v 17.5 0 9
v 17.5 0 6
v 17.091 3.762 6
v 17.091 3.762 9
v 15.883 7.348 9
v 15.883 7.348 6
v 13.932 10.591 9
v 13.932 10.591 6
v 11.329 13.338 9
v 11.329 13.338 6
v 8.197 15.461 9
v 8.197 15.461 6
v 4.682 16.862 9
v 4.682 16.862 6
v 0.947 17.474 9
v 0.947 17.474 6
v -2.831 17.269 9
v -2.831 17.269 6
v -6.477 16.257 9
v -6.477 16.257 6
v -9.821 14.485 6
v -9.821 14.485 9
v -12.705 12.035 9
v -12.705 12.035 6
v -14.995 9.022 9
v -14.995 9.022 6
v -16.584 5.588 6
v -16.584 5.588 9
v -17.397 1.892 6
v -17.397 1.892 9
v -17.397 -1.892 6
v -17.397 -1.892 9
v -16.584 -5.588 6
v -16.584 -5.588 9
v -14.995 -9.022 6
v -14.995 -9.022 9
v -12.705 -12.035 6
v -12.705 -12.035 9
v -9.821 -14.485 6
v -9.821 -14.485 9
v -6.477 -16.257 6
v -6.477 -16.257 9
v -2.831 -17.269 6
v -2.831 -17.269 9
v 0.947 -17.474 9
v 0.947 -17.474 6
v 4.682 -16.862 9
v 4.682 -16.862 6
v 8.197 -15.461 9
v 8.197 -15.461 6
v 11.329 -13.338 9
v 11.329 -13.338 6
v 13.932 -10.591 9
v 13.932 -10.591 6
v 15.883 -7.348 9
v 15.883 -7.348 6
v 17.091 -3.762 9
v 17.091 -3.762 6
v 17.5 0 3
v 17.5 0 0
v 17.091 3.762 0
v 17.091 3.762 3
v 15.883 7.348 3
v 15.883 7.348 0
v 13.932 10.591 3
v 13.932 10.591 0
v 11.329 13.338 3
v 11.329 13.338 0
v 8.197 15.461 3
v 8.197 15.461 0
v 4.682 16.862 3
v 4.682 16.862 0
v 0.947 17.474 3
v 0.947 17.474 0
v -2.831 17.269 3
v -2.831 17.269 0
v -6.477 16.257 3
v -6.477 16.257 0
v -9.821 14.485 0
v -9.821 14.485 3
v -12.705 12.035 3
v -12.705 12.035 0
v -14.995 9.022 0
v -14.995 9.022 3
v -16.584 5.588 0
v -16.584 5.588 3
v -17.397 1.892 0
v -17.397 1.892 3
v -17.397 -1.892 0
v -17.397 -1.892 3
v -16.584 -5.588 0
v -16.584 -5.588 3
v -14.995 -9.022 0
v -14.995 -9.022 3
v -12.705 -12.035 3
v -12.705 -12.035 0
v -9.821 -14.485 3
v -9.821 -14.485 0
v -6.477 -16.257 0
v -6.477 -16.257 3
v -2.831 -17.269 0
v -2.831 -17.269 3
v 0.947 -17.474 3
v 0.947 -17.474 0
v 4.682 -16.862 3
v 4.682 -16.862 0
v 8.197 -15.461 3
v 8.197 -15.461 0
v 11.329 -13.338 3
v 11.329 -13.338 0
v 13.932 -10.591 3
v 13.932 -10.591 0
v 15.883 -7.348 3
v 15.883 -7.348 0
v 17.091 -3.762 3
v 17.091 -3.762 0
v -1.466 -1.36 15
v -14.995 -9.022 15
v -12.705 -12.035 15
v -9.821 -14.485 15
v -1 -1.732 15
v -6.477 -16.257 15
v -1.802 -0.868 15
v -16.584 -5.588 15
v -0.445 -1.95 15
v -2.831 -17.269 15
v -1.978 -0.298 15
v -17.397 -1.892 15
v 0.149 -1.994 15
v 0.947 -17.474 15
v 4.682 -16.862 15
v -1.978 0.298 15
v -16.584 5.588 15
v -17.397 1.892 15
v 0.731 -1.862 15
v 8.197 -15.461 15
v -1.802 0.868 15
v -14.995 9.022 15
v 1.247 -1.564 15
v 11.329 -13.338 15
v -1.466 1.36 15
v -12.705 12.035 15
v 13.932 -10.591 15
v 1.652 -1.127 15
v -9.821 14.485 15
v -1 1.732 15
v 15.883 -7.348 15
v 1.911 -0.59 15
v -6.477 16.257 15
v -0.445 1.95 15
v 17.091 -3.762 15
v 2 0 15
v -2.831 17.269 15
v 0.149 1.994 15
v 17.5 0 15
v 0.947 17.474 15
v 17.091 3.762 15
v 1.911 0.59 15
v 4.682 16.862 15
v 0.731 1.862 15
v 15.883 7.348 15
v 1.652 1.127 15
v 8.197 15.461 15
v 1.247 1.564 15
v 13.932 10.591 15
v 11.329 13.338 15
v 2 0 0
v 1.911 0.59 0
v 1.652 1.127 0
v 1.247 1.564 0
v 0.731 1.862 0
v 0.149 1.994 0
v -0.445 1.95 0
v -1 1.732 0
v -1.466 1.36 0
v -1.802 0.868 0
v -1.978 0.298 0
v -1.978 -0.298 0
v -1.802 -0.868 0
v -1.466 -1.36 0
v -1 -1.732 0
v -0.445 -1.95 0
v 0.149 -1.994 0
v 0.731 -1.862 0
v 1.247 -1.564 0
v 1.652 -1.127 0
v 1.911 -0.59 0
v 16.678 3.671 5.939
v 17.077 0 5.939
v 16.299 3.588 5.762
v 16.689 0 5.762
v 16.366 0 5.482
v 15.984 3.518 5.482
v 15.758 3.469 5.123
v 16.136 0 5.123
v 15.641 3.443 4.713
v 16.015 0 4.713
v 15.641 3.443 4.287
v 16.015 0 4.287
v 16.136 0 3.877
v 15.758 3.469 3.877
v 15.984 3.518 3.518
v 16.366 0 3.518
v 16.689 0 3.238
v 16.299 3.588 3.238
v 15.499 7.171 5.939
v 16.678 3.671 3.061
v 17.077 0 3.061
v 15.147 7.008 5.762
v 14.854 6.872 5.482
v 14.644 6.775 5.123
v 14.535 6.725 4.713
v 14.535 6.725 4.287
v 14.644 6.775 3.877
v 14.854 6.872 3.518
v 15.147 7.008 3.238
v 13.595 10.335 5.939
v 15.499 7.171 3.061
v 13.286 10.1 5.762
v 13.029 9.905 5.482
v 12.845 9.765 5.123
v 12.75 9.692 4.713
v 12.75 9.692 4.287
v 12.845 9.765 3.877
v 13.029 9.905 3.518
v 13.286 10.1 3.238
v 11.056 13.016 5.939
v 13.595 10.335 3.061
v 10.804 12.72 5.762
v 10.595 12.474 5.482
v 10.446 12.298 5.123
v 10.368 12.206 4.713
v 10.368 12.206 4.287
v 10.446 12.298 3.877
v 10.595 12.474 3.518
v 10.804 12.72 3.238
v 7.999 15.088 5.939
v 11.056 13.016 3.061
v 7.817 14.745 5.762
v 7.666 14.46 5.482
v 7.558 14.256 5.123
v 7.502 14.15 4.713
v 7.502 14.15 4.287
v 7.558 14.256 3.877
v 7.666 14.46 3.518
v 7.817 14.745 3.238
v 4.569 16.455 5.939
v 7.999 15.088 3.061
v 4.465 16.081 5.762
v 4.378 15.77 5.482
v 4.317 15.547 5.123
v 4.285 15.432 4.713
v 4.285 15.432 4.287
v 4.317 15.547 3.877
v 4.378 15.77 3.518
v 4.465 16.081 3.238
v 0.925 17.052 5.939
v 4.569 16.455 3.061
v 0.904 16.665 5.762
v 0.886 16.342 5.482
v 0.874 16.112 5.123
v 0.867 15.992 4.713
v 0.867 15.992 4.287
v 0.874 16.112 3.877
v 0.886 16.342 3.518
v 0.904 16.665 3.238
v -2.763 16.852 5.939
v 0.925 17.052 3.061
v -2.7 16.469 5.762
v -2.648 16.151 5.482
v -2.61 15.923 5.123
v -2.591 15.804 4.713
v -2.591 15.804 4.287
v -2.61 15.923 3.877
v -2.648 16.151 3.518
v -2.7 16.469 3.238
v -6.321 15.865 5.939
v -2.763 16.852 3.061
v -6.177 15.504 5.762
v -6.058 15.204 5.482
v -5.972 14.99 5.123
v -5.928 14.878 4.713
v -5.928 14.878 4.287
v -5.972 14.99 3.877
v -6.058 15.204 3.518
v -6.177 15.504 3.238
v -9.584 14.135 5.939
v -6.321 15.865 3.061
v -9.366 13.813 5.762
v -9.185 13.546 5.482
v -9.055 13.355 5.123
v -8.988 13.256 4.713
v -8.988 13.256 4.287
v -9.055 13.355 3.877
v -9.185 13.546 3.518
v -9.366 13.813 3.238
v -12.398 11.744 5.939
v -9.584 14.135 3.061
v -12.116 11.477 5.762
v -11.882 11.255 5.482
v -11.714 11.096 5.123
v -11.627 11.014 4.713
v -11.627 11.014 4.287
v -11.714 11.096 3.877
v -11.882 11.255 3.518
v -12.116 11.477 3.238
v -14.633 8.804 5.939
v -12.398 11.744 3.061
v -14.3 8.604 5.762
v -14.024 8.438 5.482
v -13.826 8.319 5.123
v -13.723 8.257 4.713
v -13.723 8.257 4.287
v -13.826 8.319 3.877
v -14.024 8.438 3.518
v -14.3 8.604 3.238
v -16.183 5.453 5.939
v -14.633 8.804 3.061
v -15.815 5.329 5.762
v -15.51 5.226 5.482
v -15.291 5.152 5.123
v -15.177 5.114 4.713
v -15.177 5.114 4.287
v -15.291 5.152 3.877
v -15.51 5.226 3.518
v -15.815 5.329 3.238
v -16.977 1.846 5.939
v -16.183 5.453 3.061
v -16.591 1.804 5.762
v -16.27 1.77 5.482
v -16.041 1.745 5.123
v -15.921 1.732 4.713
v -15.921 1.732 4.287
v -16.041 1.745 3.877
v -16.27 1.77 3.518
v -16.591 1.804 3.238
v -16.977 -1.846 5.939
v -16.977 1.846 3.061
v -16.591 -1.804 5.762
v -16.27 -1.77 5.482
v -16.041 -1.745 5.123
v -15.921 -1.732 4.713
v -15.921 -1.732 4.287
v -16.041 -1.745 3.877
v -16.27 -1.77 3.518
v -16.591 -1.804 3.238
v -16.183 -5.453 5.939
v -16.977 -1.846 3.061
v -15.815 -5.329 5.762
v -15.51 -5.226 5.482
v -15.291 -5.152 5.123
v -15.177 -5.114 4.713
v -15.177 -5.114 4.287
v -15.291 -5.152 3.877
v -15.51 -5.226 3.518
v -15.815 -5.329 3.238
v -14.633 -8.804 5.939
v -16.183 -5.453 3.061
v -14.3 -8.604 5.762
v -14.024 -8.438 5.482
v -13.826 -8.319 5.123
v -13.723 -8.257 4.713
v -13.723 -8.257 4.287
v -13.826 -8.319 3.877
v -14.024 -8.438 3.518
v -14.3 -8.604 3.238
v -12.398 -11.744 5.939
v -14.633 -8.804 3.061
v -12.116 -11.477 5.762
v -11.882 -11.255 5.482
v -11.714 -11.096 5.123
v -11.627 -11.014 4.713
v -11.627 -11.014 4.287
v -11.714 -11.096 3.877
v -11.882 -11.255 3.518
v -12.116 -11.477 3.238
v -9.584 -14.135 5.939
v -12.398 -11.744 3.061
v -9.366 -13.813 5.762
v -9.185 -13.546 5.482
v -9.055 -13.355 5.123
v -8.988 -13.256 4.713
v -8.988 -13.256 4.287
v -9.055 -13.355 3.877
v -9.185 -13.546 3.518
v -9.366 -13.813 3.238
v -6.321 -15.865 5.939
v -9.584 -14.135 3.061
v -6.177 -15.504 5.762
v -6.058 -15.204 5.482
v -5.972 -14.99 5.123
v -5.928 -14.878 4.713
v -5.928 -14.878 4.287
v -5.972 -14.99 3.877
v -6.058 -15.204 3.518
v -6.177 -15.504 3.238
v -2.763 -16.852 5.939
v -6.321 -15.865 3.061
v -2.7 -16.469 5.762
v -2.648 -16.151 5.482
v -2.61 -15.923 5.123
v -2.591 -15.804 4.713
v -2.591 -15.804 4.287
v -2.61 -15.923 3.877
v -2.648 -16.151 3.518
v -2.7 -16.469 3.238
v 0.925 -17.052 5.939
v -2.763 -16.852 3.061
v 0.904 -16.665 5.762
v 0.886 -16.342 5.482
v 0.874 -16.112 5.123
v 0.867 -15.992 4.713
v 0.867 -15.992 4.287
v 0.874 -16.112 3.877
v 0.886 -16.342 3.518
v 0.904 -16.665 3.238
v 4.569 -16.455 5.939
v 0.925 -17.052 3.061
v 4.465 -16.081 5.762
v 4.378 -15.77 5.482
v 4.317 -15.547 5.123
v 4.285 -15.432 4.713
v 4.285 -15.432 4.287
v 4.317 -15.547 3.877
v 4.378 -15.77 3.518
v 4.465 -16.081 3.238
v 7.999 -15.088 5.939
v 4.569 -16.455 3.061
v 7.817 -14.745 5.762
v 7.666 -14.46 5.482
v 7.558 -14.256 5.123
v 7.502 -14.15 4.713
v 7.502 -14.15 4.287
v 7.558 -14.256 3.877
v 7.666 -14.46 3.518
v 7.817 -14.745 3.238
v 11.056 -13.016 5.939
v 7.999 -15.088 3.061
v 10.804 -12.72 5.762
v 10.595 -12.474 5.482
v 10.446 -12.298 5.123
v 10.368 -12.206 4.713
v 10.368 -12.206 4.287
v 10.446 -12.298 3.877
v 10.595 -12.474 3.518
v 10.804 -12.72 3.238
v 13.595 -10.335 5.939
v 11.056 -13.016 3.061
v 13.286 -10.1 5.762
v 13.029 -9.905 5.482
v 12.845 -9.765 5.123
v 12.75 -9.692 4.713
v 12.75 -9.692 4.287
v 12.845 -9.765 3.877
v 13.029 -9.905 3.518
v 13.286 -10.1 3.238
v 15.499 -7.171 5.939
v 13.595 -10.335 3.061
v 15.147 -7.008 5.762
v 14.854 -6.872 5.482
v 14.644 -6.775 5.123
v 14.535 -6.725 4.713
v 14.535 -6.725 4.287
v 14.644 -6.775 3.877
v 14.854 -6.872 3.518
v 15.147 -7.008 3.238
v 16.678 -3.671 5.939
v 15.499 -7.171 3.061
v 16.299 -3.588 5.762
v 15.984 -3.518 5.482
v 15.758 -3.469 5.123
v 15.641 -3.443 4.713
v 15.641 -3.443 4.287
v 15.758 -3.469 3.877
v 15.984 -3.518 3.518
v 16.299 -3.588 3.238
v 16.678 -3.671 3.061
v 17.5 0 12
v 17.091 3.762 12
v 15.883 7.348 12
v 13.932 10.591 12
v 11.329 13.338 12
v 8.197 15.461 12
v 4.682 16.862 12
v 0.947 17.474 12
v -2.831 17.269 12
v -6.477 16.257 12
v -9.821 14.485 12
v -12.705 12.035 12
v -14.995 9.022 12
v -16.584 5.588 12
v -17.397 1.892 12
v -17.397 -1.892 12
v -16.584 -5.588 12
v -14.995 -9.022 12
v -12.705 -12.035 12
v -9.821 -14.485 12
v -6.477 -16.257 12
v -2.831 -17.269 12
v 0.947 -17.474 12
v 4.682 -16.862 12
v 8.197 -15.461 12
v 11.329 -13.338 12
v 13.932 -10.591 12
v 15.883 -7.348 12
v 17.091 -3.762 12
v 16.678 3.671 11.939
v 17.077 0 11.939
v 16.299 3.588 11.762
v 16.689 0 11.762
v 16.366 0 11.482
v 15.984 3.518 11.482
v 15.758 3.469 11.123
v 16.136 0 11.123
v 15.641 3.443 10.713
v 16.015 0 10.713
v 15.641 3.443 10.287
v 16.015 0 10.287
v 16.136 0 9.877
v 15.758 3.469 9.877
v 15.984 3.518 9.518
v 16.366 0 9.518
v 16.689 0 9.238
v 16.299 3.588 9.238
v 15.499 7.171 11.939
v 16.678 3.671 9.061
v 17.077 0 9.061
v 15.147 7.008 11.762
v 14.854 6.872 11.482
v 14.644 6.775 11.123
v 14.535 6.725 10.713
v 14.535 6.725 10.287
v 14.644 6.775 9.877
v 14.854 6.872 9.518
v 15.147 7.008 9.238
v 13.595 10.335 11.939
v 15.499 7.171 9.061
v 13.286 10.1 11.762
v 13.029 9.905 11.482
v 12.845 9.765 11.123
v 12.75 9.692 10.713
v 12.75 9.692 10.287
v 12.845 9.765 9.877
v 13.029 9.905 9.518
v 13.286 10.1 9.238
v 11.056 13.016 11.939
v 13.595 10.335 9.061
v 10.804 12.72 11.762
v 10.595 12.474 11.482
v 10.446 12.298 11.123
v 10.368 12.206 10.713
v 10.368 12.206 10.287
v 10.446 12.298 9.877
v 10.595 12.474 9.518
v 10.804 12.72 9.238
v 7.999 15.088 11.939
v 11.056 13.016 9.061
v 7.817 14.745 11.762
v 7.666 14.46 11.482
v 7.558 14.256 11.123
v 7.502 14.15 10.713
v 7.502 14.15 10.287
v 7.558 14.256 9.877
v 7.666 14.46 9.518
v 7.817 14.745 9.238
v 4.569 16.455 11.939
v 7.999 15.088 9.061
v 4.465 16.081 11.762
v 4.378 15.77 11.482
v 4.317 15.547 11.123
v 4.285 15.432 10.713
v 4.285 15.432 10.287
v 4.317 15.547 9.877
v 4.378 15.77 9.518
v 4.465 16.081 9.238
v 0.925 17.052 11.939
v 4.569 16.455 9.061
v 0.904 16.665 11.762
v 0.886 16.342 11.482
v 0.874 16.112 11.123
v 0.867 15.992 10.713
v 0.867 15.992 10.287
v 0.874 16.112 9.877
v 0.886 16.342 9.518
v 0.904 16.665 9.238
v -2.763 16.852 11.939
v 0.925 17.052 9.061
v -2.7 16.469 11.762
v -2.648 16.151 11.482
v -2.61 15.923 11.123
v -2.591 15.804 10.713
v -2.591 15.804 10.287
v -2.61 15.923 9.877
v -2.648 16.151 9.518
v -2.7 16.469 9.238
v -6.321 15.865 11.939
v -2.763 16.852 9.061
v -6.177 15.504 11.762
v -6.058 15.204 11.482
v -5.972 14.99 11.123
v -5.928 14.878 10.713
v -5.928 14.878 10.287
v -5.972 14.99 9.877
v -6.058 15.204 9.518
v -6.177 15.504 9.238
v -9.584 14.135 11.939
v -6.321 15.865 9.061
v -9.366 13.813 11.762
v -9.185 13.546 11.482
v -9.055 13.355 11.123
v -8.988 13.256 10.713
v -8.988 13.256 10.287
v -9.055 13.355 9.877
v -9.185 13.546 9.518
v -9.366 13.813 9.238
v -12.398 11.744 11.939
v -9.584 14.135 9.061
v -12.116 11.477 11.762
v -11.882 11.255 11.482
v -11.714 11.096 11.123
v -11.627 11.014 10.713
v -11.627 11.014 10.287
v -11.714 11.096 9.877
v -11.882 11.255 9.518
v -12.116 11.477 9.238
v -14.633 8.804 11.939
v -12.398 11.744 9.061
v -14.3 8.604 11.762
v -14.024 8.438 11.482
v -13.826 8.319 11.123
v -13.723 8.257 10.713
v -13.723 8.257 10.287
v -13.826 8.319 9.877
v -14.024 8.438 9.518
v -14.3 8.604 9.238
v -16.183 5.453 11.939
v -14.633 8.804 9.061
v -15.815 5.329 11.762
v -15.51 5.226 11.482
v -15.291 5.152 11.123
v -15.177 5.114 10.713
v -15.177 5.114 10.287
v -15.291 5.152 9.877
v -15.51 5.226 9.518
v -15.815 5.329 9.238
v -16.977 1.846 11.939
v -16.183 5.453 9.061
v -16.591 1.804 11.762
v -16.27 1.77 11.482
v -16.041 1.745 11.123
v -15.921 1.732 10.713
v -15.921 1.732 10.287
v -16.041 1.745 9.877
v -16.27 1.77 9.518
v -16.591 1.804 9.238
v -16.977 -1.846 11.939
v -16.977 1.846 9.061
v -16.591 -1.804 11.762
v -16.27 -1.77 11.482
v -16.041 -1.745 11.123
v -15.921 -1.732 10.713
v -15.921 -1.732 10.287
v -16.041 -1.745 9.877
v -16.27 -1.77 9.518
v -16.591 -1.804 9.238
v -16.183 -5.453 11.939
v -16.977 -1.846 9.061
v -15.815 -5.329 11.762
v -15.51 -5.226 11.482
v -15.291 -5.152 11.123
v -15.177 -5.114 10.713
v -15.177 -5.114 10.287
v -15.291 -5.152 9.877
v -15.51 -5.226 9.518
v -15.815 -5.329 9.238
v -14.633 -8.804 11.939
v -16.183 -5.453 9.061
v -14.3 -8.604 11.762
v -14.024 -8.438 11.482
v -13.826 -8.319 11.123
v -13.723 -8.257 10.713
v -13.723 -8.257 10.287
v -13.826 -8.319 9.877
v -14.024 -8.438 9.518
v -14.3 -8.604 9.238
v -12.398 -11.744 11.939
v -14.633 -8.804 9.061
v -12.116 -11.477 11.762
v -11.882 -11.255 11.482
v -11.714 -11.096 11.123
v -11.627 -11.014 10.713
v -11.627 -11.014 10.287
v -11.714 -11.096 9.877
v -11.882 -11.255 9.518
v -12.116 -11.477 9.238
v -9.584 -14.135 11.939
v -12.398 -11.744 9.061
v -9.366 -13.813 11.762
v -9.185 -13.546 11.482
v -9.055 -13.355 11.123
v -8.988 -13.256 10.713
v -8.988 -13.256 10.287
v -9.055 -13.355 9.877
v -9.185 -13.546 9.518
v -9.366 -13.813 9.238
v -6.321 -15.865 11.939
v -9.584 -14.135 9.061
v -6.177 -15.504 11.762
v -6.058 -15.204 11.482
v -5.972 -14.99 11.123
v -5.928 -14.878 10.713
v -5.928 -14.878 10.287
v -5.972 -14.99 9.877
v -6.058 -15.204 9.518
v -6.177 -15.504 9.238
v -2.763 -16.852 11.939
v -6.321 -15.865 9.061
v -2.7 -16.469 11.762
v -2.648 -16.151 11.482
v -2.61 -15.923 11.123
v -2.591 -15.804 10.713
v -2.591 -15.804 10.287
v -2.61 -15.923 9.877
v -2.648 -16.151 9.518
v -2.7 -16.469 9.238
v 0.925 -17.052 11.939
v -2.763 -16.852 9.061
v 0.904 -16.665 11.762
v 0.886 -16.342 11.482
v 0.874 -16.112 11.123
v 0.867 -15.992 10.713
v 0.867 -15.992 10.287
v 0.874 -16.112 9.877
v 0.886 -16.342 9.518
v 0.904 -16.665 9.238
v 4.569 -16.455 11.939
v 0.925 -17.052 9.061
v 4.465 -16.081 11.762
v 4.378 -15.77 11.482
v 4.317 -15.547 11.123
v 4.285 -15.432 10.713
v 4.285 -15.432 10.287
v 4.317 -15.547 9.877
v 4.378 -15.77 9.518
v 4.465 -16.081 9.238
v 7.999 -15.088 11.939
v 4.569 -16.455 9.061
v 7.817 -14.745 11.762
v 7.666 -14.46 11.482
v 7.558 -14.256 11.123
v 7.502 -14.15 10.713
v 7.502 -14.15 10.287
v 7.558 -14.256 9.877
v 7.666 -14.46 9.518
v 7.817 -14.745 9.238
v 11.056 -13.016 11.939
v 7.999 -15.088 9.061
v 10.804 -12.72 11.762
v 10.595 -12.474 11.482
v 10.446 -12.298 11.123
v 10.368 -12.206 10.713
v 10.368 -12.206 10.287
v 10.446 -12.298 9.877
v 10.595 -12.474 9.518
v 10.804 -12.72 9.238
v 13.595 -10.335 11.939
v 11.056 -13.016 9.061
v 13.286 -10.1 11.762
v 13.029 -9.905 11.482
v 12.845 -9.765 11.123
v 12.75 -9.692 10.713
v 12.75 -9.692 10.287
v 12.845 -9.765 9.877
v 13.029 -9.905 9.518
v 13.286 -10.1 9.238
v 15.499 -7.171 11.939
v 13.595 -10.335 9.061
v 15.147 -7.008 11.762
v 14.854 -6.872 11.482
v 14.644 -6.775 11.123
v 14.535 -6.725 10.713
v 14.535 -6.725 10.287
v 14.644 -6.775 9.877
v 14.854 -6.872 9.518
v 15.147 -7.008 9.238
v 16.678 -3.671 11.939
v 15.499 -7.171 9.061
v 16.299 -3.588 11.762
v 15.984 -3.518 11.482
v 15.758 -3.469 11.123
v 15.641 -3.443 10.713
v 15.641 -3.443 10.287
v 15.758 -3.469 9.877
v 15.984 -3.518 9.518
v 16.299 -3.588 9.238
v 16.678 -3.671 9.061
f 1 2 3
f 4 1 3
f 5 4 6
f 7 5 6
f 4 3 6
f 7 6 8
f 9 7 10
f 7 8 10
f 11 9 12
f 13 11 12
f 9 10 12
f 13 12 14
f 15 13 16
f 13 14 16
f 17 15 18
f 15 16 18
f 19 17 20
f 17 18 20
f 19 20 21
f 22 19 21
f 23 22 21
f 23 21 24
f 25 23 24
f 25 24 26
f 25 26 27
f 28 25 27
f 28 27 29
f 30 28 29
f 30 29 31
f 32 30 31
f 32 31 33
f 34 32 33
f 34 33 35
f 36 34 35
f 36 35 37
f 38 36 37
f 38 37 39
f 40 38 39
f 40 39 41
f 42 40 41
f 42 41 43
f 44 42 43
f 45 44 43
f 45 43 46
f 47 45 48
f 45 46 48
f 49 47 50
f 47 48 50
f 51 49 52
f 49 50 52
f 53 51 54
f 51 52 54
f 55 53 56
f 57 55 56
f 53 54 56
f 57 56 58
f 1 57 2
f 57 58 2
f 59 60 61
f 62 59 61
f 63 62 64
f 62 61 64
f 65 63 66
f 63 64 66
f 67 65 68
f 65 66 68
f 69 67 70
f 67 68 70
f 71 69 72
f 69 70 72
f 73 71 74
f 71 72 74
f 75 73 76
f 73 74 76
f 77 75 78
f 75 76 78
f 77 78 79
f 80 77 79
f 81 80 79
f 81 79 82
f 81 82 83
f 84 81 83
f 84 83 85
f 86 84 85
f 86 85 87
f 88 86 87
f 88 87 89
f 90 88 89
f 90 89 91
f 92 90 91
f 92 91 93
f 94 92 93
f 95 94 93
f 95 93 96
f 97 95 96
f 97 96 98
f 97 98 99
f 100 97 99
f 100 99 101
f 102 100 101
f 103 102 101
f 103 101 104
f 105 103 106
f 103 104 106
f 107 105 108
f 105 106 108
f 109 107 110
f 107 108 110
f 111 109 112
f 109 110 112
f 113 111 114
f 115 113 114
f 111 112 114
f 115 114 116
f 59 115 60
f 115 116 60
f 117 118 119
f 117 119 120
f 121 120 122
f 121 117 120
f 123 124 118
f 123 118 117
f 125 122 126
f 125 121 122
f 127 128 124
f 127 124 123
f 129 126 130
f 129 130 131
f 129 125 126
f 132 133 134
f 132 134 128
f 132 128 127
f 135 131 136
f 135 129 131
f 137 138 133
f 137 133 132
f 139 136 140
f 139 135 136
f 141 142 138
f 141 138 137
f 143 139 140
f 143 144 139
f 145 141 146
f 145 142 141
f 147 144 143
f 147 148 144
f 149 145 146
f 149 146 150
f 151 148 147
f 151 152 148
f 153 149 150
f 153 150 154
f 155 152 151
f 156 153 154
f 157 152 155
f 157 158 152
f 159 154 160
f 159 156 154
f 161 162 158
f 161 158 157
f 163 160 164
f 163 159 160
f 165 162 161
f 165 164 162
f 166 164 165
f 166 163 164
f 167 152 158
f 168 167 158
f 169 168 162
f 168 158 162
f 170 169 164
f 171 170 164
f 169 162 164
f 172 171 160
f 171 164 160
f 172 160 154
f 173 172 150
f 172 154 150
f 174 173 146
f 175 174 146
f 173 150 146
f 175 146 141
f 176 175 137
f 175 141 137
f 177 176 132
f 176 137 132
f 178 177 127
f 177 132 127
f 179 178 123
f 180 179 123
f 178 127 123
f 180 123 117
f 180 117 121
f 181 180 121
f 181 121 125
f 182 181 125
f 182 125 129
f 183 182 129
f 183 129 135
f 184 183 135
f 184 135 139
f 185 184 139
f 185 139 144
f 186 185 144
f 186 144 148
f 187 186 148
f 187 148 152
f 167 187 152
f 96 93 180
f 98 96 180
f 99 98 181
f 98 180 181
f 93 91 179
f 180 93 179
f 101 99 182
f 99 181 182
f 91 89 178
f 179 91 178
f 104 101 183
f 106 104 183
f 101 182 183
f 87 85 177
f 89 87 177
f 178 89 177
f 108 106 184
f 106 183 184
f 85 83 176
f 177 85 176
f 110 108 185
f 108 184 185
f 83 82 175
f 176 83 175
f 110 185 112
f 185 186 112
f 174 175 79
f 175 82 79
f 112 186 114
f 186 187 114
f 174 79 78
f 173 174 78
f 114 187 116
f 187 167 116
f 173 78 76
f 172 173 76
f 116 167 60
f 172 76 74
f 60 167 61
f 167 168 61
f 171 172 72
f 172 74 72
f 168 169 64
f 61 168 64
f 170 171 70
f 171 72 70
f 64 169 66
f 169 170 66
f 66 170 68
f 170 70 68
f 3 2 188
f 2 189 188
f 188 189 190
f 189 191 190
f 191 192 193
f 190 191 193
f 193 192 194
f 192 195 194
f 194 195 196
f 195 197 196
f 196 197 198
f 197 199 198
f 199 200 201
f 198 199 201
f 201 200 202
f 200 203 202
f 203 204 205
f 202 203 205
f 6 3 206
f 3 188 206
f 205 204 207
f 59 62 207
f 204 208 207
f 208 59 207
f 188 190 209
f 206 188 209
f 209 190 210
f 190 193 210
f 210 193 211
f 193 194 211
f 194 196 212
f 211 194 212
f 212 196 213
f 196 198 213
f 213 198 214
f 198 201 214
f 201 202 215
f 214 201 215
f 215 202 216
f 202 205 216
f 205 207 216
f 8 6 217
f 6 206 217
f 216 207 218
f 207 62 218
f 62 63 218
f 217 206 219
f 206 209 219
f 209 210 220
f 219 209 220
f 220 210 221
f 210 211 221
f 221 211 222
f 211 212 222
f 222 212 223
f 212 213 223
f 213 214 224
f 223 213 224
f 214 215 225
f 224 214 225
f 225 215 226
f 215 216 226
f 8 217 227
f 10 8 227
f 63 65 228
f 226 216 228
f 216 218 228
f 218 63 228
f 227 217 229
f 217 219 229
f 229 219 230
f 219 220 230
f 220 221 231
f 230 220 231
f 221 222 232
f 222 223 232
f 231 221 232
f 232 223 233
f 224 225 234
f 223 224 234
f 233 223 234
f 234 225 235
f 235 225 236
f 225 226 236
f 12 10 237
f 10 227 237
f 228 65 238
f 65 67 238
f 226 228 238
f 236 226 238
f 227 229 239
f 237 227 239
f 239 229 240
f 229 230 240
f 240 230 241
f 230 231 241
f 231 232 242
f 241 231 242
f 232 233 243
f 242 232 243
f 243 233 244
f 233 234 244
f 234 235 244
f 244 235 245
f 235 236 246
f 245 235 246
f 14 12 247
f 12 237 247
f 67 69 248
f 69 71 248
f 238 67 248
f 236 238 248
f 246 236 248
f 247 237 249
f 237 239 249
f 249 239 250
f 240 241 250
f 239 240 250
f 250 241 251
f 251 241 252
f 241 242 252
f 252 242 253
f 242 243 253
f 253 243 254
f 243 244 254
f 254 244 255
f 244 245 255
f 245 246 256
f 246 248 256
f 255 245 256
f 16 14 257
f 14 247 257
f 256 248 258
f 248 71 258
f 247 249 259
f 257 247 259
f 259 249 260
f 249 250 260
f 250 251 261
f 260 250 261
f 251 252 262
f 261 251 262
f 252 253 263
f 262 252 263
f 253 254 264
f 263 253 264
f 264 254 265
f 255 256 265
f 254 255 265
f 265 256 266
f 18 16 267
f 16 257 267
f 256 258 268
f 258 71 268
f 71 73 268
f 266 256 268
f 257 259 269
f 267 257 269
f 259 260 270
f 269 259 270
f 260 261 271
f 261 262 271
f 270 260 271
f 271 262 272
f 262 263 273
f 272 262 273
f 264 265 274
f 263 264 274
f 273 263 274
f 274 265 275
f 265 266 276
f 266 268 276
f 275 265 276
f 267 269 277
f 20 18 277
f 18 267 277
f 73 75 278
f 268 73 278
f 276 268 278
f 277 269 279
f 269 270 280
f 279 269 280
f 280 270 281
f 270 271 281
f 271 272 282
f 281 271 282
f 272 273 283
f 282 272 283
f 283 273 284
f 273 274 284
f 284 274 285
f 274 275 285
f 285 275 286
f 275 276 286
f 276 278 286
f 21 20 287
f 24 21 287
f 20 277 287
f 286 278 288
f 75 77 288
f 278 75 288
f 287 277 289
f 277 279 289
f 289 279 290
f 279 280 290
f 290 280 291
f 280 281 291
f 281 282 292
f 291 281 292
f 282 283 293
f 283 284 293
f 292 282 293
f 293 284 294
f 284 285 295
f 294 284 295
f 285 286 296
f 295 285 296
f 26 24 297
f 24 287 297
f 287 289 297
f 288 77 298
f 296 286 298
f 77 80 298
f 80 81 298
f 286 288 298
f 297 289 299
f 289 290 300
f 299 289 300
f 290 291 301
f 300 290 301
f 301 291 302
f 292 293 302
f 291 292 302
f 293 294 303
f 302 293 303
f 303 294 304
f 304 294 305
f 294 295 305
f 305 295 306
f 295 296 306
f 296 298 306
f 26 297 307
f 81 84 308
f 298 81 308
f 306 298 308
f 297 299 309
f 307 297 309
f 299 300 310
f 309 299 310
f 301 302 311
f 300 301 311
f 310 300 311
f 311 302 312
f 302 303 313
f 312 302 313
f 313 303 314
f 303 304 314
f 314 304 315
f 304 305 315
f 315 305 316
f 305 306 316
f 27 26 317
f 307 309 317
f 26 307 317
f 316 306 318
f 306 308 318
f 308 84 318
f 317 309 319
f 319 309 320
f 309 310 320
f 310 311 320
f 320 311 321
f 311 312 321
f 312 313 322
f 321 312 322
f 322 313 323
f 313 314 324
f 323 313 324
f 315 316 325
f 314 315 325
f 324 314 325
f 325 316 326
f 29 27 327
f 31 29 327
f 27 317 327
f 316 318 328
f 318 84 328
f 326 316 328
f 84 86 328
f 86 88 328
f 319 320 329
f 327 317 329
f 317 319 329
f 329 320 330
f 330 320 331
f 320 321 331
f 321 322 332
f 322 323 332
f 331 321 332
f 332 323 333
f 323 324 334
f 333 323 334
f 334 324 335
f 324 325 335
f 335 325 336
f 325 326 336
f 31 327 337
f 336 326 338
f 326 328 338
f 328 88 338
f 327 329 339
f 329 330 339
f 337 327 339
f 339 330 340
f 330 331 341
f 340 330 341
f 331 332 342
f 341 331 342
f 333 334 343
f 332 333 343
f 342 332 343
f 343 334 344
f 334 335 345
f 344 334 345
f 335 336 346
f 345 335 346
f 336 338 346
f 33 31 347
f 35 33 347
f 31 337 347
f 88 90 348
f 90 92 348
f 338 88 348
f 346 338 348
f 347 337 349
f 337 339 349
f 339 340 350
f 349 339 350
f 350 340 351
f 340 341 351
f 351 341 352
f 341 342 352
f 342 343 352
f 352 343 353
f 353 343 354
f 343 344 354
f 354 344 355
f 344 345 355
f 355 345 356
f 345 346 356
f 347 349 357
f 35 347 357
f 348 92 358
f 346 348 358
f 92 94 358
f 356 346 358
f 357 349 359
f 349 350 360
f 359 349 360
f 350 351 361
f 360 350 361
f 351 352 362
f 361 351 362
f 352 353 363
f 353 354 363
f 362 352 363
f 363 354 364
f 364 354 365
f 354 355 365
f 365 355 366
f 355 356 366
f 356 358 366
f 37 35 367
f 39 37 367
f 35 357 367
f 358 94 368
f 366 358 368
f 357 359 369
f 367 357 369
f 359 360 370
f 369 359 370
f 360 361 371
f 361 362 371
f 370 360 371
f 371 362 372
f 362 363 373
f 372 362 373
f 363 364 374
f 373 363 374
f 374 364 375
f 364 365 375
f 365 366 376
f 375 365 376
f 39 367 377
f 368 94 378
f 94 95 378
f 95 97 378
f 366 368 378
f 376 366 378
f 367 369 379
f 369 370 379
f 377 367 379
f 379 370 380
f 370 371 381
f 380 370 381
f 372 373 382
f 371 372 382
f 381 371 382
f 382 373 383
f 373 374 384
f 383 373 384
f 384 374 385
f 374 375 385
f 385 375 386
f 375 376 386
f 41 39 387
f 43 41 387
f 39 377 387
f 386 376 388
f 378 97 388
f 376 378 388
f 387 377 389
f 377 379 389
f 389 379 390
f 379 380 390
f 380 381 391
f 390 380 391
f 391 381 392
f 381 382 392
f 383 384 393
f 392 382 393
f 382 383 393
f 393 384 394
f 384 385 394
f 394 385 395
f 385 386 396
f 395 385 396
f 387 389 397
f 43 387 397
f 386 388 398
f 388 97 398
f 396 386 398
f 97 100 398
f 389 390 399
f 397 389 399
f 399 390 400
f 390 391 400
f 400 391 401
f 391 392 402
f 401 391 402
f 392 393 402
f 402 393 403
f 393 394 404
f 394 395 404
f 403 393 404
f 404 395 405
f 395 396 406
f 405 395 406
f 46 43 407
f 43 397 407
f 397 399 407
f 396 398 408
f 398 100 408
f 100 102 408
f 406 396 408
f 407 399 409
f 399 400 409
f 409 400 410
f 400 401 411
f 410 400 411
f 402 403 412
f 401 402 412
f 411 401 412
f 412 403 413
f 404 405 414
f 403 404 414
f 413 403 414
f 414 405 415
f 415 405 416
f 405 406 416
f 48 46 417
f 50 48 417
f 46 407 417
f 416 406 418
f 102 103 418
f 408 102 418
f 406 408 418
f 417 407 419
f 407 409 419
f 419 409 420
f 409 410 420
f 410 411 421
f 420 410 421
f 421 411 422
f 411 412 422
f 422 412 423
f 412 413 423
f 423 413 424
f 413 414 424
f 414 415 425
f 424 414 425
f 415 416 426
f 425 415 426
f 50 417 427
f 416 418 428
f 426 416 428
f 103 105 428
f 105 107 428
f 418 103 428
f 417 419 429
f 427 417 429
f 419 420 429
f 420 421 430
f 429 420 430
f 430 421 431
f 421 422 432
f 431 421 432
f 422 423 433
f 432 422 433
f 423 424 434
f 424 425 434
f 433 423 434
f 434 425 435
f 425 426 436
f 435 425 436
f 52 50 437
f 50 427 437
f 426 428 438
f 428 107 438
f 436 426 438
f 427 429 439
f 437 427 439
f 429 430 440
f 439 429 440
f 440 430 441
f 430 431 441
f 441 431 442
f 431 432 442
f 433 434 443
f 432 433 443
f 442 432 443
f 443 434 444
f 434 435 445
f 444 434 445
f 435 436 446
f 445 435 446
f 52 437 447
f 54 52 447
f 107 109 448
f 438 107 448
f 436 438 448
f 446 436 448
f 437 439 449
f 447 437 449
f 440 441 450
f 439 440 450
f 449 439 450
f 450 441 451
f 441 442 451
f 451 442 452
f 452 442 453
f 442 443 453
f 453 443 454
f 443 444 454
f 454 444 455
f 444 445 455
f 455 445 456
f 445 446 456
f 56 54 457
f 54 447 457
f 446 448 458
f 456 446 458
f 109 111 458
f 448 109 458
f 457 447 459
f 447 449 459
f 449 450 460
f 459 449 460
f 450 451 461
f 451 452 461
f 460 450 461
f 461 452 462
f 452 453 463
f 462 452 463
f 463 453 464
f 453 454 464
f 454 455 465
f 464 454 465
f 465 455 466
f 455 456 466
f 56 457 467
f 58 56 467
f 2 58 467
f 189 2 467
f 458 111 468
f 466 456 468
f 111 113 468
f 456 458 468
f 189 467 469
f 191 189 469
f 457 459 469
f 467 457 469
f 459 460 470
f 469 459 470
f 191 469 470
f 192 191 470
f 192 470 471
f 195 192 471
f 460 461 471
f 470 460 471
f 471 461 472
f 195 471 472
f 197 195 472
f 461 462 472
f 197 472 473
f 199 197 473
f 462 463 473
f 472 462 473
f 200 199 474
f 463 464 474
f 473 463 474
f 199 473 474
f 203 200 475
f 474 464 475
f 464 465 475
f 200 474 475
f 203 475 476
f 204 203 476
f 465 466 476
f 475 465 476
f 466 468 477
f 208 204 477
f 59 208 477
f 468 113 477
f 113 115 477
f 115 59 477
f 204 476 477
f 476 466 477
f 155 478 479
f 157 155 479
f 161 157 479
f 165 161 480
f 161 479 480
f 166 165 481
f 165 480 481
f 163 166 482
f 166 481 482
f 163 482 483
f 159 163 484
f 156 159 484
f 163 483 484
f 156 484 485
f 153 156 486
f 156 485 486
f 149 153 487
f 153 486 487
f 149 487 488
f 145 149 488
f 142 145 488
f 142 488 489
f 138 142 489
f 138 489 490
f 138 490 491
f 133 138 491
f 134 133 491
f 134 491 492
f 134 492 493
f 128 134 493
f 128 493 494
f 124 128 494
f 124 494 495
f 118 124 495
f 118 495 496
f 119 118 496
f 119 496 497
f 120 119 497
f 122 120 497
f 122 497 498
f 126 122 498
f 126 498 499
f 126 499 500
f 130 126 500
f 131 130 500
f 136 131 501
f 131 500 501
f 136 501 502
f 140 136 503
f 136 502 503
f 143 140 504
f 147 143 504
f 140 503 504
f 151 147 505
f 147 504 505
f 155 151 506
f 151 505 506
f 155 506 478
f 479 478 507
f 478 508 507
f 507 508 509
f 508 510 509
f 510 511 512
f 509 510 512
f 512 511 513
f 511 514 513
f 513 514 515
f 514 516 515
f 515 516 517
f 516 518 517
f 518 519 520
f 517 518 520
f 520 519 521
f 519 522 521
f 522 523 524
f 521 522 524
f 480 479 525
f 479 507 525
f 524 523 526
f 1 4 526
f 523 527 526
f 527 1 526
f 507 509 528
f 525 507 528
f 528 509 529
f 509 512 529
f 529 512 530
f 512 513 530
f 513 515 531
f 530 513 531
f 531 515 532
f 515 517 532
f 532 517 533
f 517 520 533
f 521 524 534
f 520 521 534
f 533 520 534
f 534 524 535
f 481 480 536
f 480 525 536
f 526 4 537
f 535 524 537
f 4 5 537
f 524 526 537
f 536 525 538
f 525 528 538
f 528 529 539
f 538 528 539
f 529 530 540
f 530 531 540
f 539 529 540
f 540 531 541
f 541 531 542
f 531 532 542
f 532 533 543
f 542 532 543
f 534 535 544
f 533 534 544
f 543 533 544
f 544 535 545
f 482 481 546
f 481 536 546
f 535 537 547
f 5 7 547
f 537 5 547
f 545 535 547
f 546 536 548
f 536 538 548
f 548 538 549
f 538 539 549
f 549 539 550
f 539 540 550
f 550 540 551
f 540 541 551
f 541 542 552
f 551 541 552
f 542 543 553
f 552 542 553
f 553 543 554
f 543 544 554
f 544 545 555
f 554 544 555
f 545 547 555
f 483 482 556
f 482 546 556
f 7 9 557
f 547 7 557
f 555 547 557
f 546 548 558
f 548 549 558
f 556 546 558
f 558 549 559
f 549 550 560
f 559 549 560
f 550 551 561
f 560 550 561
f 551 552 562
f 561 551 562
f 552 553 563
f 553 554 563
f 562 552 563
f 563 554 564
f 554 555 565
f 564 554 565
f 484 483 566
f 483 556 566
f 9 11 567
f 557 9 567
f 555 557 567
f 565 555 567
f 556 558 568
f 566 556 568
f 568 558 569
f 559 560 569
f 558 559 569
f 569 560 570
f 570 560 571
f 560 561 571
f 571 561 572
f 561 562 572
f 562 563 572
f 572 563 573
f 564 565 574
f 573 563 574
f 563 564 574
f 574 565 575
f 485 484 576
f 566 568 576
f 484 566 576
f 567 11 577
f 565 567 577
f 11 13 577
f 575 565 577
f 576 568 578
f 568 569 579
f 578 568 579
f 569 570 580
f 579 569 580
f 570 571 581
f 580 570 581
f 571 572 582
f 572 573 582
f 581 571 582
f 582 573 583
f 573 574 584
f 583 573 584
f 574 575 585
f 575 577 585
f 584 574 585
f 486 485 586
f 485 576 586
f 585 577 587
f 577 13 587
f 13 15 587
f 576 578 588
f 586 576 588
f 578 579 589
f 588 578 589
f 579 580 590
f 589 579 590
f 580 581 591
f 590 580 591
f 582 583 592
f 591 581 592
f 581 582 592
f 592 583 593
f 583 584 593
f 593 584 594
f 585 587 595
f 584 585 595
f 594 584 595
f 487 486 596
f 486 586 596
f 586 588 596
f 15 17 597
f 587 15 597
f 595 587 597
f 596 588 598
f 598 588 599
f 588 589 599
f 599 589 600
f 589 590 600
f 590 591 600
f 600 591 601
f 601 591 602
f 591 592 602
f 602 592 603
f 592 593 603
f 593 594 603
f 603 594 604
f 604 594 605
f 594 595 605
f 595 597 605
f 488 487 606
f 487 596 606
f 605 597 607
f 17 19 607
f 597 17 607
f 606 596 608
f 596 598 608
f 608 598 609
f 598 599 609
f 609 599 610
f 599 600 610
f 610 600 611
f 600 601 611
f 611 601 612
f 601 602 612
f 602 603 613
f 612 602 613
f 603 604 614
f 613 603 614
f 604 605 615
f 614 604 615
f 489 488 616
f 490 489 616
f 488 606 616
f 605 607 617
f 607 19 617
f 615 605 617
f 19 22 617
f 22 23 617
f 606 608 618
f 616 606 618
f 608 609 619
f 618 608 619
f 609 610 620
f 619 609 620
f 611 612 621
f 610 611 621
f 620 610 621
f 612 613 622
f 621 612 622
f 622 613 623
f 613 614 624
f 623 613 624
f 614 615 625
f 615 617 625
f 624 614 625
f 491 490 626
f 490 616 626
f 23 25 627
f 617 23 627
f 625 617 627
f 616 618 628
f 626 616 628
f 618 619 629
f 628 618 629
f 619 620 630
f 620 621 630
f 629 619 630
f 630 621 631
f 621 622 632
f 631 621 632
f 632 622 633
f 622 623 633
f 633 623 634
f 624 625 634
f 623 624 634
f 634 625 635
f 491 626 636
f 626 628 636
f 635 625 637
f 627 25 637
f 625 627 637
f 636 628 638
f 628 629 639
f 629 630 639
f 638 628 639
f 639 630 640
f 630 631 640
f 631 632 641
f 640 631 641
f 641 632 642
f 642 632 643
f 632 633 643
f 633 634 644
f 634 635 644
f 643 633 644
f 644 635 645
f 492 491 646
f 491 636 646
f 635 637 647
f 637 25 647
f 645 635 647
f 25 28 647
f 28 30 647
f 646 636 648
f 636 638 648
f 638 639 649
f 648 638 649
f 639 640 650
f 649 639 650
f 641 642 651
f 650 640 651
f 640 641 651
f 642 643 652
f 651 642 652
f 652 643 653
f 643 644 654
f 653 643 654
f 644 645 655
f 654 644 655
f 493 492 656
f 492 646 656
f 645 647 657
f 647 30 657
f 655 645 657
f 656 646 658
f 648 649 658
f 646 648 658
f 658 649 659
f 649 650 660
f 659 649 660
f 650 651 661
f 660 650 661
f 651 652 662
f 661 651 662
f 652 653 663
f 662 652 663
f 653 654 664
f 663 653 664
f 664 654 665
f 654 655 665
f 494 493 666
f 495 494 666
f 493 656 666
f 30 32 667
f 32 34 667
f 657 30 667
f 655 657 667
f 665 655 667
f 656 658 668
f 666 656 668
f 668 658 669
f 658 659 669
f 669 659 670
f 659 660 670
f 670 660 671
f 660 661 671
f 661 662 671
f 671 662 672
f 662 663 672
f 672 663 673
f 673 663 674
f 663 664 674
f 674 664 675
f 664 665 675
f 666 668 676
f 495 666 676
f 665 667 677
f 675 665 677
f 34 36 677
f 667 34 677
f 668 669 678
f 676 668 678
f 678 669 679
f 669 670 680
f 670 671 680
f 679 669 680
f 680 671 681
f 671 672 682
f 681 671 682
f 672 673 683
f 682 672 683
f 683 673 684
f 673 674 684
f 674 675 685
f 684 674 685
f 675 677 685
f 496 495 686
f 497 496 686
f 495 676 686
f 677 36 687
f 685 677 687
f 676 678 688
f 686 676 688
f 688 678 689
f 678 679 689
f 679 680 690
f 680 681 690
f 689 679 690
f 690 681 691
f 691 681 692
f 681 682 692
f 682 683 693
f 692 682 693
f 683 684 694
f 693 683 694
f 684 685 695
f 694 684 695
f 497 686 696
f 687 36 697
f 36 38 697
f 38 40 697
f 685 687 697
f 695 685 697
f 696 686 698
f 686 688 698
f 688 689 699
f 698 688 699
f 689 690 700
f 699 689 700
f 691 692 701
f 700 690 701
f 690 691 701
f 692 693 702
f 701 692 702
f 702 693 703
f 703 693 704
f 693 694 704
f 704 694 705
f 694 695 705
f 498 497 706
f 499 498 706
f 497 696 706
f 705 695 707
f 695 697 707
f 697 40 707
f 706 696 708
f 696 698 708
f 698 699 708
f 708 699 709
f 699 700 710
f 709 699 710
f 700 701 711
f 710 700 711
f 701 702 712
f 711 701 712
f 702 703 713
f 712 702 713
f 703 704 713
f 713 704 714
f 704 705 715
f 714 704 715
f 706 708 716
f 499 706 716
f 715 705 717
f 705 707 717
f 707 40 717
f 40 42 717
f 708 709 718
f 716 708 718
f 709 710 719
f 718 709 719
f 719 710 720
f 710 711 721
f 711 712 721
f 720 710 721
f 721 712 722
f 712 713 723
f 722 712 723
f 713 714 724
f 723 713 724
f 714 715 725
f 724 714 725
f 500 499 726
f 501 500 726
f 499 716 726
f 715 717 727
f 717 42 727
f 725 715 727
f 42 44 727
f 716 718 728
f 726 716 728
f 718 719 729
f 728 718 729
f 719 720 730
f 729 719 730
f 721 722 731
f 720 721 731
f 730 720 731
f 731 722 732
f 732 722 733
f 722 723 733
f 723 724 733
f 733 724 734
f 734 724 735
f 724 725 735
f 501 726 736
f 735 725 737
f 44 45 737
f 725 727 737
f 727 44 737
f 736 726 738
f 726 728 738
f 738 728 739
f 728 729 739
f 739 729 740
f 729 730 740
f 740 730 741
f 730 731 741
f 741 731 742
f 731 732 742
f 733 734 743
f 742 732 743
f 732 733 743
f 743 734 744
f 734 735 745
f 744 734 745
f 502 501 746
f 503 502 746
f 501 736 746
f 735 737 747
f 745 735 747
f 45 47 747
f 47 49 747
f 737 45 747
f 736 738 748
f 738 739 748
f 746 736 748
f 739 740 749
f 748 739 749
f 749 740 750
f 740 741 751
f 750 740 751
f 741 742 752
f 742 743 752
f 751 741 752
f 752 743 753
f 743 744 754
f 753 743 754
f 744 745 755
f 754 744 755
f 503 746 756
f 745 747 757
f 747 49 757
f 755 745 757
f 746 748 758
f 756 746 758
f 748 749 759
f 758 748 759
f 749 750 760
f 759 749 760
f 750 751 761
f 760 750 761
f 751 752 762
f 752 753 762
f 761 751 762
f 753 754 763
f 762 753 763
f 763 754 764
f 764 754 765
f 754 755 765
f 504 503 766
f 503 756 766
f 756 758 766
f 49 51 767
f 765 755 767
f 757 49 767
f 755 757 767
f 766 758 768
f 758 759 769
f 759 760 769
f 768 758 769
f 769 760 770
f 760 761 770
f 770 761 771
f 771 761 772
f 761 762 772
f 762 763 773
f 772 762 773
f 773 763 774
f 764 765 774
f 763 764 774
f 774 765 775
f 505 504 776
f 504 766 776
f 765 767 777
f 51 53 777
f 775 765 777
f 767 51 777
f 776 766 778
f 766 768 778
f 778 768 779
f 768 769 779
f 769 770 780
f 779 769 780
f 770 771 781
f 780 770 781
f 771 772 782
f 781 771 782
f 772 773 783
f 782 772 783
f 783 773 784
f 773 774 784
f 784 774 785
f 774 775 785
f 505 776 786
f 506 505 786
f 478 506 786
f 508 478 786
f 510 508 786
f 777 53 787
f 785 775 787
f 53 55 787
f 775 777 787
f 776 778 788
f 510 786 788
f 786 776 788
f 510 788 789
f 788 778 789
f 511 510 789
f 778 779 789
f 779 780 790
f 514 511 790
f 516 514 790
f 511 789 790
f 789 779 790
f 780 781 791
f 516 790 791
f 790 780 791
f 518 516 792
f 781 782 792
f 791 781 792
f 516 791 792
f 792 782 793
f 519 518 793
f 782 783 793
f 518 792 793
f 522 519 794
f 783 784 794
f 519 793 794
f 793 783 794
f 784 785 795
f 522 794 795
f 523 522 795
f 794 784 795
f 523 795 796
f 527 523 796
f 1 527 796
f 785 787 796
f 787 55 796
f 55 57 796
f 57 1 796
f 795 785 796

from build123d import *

# Parameters (mm, degrees)
TORUS001_R     = 1.5
TORUS_R        = 1.5
CYLINDER_R     = 17.5
CYLINDER_DEPTH = 15
SKETCH_R       = 2
POCKET_DEPTH   = 15.001


with BuildPart() as bottom_o_ring:
    # Torus001 → Torus001 (revolve)
    with BuildSketch(Plane(origin=(0, 0, 4.5), x_dir=(1, 0, 0), z_dir=(0, -1, 0))):
        with Locations((17.5, 0)):
            Circle(TORUS001_R)
    revolve(axis=Axis((0, 0, 4.5), (0, 0, 1)))


with BuildPart() as o_rings:
    # Torus → Torus (revolve)
    with BuildSketch(Plane(origin=(0, 0, 10.5), x_dir=(1, 0, 0), z_dir=(0, -1, 0))):
        with Locations((17.5, 0)):
            Circle(TORUS_R)
    revolve(axis=Axis((0, 0, 10.5), (0, 0, 1)))

    # Fusion: union bottom-o-ring
    add(bottom_o_ring.part)


with BuildPart() as drill_axle:
    # Cylinder → Cylinder (new body)
    with BuildSketch(Plane.XY):
        Circle(CYLINDER_R)
    extrude(amount=CYLINDER_DEPTH)

    # Cut: cut o-rings
    add(o_rings.part, mode=Mode.SUBTRACT)

    # Sketch → Pocket (cut, through all)
    with BuildSketch(Plane.XY.offset(15)):
        Circle(SKETCH_R)
    extrude(amount=-POCKET_DEPTH, mode=Mode.SUBTRACT)


solid = drill_axle.part
